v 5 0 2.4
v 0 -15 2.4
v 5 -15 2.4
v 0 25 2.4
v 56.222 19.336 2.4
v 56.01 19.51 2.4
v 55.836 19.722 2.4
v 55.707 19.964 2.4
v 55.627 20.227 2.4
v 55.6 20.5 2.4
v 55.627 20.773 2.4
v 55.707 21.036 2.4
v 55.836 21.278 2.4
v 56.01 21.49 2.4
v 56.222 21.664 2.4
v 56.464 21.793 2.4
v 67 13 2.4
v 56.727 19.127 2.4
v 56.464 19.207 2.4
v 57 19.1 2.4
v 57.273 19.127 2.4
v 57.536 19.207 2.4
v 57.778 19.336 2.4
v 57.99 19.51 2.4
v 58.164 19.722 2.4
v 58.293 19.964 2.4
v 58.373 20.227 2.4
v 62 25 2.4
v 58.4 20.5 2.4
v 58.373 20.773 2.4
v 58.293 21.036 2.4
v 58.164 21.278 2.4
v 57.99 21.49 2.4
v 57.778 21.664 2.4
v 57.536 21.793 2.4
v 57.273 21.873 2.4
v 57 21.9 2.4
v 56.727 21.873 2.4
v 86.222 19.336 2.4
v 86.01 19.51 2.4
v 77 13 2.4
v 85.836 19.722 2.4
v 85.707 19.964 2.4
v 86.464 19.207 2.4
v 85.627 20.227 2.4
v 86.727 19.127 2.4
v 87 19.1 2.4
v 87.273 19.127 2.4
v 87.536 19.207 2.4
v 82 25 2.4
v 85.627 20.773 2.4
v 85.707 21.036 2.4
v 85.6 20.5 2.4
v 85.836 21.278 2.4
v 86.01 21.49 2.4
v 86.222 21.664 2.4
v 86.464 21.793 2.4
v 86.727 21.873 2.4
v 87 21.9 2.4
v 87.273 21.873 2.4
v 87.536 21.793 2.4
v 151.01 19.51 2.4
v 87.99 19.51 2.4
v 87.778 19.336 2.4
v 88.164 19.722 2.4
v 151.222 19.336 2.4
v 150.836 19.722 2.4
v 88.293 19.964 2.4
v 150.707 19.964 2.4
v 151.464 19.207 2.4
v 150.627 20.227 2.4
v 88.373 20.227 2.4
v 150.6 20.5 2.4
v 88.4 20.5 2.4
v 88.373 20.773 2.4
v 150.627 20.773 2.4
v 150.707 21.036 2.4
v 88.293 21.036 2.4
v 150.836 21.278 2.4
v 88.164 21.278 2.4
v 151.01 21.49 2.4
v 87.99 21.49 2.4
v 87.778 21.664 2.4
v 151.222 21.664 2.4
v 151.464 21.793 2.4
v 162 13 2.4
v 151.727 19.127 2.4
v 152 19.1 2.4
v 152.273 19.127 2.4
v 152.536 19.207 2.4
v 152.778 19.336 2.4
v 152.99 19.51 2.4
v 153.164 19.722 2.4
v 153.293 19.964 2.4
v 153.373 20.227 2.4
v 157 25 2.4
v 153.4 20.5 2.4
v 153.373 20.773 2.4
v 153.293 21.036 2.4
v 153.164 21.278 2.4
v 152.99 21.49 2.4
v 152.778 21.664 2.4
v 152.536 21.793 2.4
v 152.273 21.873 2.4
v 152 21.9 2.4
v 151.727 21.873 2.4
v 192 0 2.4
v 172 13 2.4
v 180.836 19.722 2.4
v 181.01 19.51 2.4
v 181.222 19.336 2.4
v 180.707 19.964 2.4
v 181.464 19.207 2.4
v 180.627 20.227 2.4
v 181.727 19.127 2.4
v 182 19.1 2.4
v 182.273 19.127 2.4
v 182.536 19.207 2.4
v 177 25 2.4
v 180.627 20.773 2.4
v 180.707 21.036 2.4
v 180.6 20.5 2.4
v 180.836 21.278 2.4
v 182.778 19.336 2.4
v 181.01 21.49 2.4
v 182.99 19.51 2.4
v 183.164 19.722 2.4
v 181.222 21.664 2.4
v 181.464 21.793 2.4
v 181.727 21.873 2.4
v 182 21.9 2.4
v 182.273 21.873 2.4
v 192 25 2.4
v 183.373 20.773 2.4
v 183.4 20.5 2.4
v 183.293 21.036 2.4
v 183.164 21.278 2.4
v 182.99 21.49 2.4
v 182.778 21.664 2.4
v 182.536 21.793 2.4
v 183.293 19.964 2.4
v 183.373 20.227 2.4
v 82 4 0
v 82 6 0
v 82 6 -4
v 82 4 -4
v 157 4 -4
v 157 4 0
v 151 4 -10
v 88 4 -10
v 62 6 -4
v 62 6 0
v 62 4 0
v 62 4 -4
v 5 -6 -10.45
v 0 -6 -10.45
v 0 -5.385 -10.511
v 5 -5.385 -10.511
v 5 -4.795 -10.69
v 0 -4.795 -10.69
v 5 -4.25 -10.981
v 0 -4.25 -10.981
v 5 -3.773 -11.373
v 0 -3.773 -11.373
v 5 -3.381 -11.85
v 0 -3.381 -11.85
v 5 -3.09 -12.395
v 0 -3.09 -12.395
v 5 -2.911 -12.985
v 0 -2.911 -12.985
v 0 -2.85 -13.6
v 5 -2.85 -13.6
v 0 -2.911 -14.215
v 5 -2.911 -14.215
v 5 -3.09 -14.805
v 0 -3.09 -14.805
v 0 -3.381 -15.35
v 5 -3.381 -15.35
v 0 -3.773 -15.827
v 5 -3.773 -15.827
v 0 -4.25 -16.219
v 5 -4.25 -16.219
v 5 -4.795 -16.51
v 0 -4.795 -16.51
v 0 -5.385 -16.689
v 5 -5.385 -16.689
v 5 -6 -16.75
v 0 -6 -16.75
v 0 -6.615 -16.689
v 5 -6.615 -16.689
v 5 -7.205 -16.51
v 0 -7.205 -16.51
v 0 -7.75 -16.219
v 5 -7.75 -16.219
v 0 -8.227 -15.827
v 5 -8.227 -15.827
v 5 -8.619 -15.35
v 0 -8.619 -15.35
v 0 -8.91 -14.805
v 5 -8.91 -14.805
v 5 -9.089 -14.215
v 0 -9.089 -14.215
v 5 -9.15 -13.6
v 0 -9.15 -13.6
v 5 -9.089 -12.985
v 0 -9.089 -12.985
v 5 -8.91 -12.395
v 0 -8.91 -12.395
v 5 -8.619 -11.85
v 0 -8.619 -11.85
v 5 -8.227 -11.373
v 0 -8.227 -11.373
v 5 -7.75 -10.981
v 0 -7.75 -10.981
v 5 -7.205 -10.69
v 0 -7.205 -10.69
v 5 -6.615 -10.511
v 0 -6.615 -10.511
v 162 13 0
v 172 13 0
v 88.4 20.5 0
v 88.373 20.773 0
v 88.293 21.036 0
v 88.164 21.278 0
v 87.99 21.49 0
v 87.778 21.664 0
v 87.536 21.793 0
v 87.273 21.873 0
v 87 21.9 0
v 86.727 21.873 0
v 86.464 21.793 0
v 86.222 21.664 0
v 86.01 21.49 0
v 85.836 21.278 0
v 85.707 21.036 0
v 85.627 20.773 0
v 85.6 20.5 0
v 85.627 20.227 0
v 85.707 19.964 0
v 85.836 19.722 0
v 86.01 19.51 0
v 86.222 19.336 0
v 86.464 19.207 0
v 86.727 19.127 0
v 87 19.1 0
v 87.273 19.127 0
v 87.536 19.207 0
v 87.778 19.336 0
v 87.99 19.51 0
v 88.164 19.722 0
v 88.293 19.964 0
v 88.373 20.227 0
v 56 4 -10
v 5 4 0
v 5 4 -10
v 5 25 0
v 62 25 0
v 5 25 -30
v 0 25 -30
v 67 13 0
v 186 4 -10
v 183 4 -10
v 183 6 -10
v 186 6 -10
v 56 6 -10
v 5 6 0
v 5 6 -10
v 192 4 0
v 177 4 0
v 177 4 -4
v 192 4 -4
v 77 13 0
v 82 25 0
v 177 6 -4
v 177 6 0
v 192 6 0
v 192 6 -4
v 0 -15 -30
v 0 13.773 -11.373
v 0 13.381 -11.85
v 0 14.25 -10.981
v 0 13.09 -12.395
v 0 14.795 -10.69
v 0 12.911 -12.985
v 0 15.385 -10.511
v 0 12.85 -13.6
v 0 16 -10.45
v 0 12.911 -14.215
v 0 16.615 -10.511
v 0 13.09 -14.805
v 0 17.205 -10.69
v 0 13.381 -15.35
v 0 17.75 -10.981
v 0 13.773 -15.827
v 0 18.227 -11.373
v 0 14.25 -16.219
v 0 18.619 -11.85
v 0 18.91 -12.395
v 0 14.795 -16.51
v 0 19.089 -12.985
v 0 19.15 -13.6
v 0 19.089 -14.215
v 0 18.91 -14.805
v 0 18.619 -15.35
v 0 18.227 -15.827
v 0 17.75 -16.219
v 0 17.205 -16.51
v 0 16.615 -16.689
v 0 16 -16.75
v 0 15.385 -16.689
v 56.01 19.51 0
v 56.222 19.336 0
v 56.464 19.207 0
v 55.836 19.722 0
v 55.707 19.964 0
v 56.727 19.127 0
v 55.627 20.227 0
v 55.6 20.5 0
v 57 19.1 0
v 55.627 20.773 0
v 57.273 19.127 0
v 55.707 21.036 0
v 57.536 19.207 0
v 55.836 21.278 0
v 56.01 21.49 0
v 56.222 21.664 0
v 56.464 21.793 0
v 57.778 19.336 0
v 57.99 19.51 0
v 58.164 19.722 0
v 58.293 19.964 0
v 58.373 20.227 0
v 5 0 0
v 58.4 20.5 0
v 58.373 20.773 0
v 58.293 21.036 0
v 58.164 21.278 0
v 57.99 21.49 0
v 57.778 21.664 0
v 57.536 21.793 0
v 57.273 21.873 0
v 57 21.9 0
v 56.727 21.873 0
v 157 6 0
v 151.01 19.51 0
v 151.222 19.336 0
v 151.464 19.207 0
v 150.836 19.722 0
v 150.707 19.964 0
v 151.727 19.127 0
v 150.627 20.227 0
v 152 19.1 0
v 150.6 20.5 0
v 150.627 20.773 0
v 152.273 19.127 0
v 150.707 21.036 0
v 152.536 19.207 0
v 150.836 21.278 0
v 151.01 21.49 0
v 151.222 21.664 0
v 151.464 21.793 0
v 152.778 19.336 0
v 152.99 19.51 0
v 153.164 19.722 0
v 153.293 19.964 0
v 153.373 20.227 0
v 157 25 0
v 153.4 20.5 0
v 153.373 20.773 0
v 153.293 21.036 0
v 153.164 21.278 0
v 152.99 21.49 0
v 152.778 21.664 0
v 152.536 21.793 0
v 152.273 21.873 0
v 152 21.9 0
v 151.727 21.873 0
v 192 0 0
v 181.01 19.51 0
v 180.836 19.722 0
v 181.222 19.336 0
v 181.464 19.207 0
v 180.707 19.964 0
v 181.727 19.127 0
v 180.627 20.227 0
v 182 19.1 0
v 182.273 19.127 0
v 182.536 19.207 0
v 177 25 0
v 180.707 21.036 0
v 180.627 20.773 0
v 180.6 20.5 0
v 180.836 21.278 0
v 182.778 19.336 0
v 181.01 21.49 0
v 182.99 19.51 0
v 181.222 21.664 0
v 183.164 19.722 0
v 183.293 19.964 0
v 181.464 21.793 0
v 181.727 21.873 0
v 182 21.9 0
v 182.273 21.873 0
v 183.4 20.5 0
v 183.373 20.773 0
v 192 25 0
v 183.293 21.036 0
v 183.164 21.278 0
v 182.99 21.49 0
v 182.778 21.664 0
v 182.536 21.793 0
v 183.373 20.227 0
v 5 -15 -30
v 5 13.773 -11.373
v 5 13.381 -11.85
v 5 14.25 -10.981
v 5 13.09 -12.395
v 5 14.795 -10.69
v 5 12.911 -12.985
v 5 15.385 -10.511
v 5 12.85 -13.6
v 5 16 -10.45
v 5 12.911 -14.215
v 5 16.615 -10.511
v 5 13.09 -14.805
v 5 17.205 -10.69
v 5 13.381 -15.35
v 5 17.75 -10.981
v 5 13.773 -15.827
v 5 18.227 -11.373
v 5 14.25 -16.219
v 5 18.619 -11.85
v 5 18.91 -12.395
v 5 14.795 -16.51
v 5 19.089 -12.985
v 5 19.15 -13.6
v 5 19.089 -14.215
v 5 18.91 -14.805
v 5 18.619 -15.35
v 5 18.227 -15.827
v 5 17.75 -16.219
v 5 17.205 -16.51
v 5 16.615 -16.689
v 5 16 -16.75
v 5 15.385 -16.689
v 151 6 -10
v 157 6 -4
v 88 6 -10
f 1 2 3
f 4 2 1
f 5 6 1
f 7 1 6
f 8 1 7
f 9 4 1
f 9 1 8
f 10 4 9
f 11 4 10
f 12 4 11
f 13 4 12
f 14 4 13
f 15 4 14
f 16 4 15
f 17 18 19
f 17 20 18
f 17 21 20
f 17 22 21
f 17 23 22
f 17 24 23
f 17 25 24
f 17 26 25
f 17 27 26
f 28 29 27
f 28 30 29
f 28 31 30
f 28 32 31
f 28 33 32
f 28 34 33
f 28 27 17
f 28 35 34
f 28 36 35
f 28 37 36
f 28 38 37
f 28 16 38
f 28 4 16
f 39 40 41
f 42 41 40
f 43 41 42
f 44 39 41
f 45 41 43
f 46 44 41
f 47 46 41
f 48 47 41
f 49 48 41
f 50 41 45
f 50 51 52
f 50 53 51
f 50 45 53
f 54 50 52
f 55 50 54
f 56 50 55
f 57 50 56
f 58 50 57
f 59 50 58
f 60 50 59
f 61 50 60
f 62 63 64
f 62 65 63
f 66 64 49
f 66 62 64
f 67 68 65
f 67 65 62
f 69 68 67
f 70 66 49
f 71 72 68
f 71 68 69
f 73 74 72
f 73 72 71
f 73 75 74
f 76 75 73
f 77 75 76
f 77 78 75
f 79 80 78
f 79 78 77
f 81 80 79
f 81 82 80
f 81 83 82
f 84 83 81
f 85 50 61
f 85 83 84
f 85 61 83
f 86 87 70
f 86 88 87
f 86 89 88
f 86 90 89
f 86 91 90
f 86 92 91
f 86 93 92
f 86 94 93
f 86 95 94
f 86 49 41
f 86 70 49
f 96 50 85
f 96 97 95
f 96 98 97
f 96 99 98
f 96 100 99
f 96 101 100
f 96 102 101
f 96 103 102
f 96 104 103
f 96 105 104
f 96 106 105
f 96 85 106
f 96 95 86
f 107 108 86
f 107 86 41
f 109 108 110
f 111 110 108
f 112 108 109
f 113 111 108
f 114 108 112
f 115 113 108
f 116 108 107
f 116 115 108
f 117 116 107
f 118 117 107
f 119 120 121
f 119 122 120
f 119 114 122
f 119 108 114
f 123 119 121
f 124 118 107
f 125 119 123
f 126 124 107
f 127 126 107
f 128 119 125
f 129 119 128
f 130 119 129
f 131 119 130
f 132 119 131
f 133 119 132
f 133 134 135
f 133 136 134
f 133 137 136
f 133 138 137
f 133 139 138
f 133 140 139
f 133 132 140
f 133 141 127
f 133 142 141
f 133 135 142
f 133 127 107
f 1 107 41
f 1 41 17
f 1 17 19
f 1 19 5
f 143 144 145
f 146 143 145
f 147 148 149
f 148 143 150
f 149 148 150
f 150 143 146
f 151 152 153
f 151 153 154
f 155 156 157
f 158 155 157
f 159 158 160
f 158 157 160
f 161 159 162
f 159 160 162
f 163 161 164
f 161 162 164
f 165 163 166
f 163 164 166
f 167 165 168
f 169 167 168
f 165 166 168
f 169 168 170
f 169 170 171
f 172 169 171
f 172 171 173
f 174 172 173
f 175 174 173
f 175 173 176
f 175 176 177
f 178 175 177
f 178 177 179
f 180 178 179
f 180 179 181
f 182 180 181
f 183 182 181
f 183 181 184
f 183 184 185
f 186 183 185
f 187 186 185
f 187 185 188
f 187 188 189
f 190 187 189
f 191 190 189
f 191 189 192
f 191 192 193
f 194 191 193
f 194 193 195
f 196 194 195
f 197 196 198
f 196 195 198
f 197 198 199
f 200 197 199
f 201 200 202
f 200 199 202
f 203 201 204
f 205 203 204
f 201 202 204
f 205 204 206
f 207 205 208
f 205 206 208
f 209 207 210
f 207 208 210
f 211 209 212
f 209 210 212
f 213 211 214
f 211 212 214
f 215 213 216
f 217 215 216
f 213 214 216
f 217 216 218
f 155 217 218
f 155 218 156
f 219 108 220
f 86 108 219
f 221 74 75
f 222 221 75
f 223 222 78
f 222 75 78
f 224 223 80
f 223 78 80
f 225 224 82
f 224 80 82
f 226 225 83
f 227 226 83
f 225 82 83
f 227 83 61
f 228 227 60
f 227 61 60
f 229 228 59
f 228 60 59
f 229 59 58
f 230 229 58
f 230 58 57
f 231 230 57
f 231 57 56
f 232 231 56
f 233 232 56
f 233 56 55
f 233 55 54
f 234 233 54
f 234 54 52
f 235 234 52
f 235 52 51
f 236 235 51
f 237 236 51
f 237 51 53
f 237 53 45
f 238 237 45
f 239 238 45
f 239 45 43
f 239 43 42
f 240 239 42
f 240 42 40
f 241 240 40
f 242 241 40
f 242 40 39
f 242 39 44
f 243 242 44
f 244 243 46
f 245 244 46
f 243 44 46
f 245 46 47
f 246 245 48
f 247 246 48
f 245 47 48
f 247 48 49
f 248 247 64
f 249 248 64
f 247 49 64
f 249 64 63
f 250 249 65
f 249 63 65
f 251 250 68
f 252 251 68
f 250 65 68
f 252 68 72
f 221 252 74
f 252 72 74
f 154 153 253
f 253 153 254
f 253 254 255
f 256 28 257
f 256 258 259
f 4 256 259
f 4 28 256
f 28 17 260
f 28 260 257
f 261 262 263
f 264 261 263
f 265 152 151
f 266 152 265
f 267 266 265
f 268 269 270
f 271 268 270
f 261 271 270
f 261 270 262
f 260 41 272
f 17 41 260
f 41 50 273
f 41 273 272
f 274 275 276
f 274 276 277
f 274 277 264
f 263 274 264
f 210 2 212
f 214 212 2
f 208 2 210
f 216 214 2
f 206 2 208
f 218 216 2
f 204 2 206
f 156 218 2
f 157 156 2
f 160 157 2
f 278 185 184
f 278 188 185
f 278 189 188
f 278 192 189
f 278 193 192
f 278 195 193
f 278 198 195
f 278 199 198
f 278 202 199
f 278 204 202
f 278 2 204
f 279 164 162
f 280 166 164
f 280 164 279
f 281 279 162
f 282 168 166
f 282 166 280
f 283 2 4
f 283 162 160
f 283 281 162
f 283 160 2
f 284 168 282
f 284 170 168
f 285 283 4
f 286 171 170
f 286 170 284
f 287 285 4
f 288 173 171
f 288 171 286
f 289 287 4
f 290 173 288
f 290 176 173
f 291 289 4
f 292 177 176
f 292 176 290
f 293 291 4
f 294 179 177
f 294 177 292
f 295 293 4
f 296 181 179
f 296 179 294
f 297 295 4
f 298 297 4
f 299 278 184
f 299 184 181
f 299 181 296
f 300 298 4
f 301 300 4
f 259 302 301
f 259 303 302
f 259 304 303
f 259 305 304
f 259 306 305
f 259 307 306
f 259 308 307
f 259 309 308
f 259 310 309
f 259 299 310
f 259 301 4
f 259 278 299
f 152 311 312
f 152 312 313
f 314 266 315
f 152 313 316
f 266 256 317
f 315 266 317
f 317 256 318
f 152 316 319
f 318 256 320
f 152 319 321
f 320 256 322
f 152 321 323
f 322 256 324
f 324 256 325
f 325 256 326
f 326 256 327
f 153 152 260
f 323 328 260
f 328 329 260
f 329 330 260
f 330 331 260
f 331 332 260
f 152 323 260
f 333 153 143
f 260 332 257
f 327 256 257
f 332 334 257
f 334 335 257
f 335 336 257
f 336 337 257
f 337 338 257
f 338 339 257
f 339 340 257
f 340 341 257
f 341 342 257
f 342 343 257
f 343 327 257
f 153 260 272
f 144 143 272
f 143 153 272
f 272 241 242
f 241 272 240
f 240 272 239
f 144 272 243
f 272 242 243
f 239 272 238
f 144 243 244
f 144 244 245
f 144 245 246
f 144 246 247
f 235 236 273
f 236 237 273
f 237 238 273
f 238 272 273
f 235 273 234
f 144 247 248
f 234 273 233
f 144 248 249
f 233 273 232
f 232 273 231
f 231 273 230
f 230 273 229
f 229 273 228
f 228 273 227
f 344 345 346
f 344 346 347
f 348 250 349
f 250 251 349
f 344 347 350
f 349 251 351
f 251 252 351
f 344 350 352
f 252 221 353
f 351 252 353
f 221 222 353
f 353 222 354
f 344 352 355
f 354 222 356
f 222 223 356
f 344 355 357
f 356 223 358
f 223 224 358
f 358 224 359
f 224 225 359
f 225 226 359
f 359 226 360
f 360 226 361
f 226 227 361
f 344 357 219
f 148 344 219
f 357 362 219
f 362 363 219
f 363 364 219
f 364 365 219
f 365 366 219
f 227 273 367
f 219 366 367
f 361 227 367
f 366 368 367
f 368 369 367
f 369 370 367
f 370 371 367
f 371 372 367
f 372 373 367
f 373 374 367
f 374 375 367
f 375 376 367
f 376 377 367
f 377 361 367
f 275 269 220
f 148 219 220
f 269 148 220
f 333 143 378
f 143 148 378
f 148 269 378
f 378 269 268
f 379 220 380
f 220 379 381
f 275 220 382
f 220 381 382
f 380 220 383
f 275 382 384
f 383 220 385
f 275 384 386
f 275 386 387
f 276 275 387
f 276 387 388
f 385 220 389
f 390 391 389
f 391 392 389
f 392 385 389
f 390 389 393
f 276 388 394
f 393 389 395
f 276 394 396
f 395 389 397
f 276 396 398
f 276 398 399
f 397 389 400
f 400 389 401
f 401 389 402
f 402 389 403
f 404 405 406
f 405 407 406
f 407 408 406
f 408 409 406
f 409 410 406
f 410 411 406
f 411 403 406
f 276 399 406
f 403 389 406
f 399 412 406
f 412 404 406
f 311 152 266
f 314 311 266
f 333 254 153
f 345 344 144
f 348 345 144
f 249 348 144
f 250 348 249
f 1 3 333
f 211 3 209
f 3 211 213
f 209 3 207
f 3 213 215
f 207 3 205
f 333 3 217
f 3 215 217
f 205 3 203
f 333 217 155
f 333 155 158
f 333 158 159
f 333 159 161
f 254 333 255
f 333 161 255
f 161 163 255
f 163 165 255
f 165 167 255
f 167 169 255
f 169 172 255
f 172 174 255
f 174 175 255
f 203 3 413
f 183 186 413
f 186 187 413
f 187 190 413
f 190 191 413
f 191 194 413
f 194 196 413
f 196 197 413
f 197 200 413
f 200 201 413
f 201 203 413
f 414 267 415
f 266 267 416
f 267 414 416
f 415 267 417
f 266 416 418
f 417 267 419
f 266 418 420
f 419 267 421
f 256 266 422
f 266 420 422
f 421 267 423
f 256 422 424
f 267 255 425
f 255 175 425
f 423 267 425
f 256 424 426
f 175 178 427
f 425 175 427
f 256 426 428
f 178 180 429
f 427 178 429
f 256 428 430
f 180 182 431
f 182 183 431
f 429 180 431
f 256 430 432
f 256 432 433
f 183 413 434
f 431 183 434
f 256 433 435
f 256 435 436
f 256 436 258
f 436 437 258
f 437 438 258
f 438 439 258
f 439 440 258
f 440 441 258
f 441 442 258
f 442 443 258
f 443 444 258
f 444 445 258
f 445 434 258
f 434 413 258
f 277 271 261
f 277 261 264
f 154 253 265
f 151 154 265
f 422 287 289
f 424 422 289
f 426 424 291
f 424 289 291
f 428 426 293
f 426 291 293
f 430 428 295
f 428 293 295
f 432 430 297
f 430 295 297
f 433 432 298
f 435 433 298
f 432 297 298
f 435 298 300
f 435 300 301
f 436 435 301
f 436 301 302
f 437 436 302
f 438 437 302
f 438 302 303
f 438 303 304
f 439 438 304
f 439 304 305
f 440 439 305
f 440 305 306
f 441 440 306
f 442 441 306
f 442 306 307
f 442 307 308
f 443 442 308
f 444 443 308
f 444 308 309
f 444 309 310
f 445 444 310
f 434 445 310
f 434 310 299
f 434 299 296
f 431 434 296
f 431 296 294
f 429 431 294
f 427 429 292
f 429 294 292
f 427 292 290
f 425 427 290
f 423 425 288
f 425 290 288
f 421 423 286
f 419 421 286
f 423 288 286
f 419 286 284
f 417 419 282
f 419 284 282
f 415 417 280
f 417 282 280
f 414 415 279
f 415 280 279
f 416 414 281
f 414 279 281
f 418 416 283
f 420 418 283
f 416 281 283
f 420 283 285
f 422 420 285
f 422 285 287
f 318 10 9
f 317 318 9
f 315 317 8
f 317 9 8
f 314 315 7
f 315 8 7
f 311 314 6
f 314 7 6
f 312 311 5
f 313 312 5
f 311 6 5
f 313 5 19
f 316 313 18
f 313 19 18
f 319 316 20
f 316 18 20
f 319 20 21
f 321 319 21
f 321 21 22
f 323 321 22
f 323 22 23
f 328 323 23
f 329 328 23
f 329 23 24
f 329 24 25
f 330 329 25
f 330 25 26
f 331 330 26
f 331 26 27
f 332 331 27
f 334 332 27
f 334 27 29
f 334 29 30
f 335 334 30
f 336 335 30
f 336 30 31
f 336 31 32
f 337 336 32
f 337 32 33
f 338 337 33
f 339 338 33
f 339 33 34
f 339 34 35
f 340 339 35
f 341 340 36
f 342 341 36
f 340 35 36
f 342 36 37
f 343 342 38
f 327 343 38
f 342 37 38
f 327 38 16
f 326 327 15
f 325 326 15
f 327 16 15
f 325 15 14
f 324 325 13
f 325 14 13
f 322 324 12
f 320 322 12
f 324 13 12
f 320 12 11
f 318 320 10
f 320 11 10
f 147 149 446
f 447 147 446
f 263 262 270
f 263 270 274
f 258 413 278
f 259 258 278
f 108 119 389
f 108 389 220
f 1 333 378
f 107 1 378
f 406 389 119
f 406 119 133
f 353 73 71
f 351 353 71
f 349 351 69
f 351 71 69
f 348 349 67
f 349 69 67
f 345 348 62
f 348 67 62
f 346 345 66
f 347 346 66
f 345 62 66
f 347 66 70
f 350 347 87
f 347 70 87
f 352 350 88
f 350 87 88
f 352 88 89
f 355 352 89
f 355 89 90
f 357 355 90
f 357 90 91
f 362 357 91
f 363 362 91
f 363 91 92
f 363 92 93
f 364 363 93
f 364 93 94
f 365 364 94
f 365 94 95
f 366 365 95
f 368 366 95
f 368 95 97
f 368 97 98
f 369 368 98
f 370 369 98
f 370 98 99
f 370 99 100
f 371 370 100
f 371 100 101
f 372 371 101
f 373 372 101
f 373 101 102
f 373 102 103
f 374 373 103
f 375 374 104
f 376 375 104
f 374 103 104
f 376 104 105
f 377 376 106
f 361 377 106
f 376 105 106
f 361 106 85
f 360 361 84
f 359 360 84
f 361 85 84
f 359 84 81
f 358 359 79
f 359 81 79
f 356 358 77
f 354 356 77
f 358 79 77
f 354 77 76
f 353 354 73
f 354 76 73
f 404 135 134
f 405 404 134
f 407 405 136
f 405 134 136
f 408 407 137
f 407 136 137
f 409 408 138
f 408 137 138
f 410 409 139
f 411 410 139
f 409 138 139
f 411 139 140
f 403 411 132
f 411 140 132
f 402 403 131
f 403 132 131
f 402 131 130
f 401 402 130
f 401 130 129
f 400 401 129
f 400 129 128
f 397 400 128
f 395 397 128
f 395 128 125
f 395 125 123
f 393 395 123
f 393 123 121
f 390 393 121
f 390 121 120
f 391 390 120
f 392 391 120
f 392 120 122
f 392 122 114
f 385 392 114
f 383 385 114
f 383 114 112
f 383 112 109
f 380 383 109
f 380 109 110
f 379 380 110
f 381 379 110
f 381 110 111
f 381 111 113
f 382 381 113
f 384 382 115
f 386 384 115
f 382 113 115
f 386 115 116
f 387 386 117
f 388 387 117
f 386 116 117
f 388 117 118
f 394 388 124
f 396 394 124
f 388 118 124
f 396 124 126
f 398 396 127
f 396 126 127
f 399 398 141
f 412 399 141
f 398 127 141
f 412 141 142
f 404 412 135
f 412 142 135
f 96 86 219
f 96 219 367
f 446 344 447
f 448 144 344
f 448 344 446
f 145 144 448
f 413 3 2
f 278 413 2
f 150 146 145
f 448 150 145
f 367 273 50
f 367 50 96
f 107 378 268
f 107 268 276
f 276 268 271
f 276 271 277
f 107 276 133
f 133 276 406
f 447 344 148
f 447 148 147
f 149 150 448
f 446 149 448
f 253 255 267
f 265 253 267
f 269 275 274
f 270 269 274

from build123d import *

# Parameters (mm, degrees)
SKETCH1_W                       = 192
SKETCH1_H                       = 25
BOSS_EXTRUDE1_DEPTH             = 2.4
SKETCH2_R                       = 1.4
CUT_EXTRUDE1_DEPTH              = 194.635637216
SKETCH3_W                       = 5
SKETCH3_H                       = 40
BOSS_EXTRUDE2_DEPTH             = 30
BOSS_EXTRUDE2_DIRECTION_2_REACH = 195.636
SKETCH4_R                       = 3.15
CUT_EXTRUDE2_DEPTH              = 30
SKETCH8_W                       = 10
SKETCH8_H                       = 2
BOSS_EXTRUDE4_DEPTH             = 187
SKETCH9_W                       = 20
SKETCH9_H                       = 13.857334598
CUT_EXTRUDE4_DEPTH              = 199.403628999
CHAMFER5_SIZE                   = 6


with BuildPart() as part:
    # Sketch1 → Boss-Extrude1 (new body)
    with BuildSketch(Plane.XY):
        with Locations((96, 12.5)):
            Rectangle(SKETCH1_W, SKETCH1_H)
    extrude(amount=BOSS_EXTRUDE1_DEPTH)

    # Sketch2 → Cut-Extrude1 (cut, through all)
    with BuildSketch(Plane.XY.offset(2.4)):
        with Locations((87, 20.5)):
            Circle(SKETCH2_R)
        with Locations(Location((57, 20.5, 0), (0, 0, 180))):
            Circle(SKETCH2_R)
        with Locations(Location((152, 20.5, 0), (0, 0, 180))):
            Circle(SKETCH2_R)
        with Locations((182, 20.5)):
            Circle(SKETCH2_R)
        Polygon((177, 25), (172, 13), (162, 13), (157, 25), align=None)
        Polygon((82, 25), (77, 13), (67, 13), (62, 25), align=None)
    extrude(amount=-CUT_EXTRUDE1_DEPTH, mode=Mode.SUBTRACT)

    # Sketch3 → Boss-Extrude2 (add)
    with BuildSketch(Plane(origin=(0, 0, 0), x_dir=(-1, 0, 0), z_dir=(0, 0, -1))):
        with Locations((-2.5, 5)):
            Rectangle(SKETCH3_W, SKETCH3_H)
    extrude(amount=BOSS_EXTRUDE2_DEPTH)

    # Boss-Extrude2 direction 2: up to this face of the body (flat: up to its plane)
    boss_extrude2_direction_2_end = Plane(part.part.faces().sort_by_distance((93.952876609, 11.871051408, 2.4))[0])
    # Sketch3 → Boss-Extrude2 direction 2 (add, up to the picked face)
    with BuildSketch(Plane(origin=(0, 0, 0), x_dir=(-1, 0, 0), z_dir=(0, 0, -1)), mode=Mode.PRIVATE) as boss_extrude2_direction_2_sk1:
        with Locations((-2.5, 5)):
            Rectangle(SKETCH3_W, SKETCH3_H)
    boss_extrude2_direction_2_tool1 = split(extrude(boss_extrude2_direction_2_sk1.sketch, amount=-BOSS_EXTRUDE2_DIRECTION_2_REACH, mode=Mode.PRIVATE), bisect_by=boss_extrude2_direction_2_end, keep=Keep.BOTH, mode=Mode.PRIVATE)
    add(boss_extrude2_direction_2_tool1.solids().sort_by(Axis((2.5, 5, 0), (0, 0, 1)))[0])

    # Sketch4 → Cut-Extrude2 (cut)
    with BuildSketch(Plane.ZY):
        with Locations((-13.6, 16)):
            Circle(SKETCH4_R)
        with Locations((-13.6, -6)):
            Circle(SKETCH4_R)
    extrude(amount=-CUT_EXTRUDE2_DEPTH, mode=Mode.SUBTRACT)

    # Sketch8 → Boss-Extrude4 (add)
    with BuildSketch(Plane(origin=(5, 0, 0), x_dir=(0, 0, -1), z_dir=(1, 0, 0))):
        with Locations((5, 5)):
            Rectangle(SKETCH8_W, SKETCH8_H)
    extrude(amount=BOSS_EXTRUDE4_DEPTH)

    # Sketch9 → Cut-Extrude4 (cut, through all)
    with BuildSketch(Plane(origin=(0, 25, 0), x_dir=(1, 0, 0), z_dir=(0, 1, 0))):
        with Locations((72, 6.928667299)):
            Rectangle(SKETCH9_W, SKETCH9_H)
        with Locations((167, 6.928667299)):
            Rectangle(SKETCH9_W, SKETCH9_H)
    extrude(amount=-CUT_EXTRUDE4_DEPTH, mode=Mode.SUBTRACT)

    # Chamfer5
    chamfer5_edges = [part.edges().sort_by_distance(p)[0] for p in [
        (62, 5, -10),
        (82, 5, -10),
        (157, 5, -10),
        (177, 5, -10),
        (192, 5, -10),
    ]]
    chamfer(chamfer5_edges, length=CHAMFER5_SIZE)


solid = part.part
